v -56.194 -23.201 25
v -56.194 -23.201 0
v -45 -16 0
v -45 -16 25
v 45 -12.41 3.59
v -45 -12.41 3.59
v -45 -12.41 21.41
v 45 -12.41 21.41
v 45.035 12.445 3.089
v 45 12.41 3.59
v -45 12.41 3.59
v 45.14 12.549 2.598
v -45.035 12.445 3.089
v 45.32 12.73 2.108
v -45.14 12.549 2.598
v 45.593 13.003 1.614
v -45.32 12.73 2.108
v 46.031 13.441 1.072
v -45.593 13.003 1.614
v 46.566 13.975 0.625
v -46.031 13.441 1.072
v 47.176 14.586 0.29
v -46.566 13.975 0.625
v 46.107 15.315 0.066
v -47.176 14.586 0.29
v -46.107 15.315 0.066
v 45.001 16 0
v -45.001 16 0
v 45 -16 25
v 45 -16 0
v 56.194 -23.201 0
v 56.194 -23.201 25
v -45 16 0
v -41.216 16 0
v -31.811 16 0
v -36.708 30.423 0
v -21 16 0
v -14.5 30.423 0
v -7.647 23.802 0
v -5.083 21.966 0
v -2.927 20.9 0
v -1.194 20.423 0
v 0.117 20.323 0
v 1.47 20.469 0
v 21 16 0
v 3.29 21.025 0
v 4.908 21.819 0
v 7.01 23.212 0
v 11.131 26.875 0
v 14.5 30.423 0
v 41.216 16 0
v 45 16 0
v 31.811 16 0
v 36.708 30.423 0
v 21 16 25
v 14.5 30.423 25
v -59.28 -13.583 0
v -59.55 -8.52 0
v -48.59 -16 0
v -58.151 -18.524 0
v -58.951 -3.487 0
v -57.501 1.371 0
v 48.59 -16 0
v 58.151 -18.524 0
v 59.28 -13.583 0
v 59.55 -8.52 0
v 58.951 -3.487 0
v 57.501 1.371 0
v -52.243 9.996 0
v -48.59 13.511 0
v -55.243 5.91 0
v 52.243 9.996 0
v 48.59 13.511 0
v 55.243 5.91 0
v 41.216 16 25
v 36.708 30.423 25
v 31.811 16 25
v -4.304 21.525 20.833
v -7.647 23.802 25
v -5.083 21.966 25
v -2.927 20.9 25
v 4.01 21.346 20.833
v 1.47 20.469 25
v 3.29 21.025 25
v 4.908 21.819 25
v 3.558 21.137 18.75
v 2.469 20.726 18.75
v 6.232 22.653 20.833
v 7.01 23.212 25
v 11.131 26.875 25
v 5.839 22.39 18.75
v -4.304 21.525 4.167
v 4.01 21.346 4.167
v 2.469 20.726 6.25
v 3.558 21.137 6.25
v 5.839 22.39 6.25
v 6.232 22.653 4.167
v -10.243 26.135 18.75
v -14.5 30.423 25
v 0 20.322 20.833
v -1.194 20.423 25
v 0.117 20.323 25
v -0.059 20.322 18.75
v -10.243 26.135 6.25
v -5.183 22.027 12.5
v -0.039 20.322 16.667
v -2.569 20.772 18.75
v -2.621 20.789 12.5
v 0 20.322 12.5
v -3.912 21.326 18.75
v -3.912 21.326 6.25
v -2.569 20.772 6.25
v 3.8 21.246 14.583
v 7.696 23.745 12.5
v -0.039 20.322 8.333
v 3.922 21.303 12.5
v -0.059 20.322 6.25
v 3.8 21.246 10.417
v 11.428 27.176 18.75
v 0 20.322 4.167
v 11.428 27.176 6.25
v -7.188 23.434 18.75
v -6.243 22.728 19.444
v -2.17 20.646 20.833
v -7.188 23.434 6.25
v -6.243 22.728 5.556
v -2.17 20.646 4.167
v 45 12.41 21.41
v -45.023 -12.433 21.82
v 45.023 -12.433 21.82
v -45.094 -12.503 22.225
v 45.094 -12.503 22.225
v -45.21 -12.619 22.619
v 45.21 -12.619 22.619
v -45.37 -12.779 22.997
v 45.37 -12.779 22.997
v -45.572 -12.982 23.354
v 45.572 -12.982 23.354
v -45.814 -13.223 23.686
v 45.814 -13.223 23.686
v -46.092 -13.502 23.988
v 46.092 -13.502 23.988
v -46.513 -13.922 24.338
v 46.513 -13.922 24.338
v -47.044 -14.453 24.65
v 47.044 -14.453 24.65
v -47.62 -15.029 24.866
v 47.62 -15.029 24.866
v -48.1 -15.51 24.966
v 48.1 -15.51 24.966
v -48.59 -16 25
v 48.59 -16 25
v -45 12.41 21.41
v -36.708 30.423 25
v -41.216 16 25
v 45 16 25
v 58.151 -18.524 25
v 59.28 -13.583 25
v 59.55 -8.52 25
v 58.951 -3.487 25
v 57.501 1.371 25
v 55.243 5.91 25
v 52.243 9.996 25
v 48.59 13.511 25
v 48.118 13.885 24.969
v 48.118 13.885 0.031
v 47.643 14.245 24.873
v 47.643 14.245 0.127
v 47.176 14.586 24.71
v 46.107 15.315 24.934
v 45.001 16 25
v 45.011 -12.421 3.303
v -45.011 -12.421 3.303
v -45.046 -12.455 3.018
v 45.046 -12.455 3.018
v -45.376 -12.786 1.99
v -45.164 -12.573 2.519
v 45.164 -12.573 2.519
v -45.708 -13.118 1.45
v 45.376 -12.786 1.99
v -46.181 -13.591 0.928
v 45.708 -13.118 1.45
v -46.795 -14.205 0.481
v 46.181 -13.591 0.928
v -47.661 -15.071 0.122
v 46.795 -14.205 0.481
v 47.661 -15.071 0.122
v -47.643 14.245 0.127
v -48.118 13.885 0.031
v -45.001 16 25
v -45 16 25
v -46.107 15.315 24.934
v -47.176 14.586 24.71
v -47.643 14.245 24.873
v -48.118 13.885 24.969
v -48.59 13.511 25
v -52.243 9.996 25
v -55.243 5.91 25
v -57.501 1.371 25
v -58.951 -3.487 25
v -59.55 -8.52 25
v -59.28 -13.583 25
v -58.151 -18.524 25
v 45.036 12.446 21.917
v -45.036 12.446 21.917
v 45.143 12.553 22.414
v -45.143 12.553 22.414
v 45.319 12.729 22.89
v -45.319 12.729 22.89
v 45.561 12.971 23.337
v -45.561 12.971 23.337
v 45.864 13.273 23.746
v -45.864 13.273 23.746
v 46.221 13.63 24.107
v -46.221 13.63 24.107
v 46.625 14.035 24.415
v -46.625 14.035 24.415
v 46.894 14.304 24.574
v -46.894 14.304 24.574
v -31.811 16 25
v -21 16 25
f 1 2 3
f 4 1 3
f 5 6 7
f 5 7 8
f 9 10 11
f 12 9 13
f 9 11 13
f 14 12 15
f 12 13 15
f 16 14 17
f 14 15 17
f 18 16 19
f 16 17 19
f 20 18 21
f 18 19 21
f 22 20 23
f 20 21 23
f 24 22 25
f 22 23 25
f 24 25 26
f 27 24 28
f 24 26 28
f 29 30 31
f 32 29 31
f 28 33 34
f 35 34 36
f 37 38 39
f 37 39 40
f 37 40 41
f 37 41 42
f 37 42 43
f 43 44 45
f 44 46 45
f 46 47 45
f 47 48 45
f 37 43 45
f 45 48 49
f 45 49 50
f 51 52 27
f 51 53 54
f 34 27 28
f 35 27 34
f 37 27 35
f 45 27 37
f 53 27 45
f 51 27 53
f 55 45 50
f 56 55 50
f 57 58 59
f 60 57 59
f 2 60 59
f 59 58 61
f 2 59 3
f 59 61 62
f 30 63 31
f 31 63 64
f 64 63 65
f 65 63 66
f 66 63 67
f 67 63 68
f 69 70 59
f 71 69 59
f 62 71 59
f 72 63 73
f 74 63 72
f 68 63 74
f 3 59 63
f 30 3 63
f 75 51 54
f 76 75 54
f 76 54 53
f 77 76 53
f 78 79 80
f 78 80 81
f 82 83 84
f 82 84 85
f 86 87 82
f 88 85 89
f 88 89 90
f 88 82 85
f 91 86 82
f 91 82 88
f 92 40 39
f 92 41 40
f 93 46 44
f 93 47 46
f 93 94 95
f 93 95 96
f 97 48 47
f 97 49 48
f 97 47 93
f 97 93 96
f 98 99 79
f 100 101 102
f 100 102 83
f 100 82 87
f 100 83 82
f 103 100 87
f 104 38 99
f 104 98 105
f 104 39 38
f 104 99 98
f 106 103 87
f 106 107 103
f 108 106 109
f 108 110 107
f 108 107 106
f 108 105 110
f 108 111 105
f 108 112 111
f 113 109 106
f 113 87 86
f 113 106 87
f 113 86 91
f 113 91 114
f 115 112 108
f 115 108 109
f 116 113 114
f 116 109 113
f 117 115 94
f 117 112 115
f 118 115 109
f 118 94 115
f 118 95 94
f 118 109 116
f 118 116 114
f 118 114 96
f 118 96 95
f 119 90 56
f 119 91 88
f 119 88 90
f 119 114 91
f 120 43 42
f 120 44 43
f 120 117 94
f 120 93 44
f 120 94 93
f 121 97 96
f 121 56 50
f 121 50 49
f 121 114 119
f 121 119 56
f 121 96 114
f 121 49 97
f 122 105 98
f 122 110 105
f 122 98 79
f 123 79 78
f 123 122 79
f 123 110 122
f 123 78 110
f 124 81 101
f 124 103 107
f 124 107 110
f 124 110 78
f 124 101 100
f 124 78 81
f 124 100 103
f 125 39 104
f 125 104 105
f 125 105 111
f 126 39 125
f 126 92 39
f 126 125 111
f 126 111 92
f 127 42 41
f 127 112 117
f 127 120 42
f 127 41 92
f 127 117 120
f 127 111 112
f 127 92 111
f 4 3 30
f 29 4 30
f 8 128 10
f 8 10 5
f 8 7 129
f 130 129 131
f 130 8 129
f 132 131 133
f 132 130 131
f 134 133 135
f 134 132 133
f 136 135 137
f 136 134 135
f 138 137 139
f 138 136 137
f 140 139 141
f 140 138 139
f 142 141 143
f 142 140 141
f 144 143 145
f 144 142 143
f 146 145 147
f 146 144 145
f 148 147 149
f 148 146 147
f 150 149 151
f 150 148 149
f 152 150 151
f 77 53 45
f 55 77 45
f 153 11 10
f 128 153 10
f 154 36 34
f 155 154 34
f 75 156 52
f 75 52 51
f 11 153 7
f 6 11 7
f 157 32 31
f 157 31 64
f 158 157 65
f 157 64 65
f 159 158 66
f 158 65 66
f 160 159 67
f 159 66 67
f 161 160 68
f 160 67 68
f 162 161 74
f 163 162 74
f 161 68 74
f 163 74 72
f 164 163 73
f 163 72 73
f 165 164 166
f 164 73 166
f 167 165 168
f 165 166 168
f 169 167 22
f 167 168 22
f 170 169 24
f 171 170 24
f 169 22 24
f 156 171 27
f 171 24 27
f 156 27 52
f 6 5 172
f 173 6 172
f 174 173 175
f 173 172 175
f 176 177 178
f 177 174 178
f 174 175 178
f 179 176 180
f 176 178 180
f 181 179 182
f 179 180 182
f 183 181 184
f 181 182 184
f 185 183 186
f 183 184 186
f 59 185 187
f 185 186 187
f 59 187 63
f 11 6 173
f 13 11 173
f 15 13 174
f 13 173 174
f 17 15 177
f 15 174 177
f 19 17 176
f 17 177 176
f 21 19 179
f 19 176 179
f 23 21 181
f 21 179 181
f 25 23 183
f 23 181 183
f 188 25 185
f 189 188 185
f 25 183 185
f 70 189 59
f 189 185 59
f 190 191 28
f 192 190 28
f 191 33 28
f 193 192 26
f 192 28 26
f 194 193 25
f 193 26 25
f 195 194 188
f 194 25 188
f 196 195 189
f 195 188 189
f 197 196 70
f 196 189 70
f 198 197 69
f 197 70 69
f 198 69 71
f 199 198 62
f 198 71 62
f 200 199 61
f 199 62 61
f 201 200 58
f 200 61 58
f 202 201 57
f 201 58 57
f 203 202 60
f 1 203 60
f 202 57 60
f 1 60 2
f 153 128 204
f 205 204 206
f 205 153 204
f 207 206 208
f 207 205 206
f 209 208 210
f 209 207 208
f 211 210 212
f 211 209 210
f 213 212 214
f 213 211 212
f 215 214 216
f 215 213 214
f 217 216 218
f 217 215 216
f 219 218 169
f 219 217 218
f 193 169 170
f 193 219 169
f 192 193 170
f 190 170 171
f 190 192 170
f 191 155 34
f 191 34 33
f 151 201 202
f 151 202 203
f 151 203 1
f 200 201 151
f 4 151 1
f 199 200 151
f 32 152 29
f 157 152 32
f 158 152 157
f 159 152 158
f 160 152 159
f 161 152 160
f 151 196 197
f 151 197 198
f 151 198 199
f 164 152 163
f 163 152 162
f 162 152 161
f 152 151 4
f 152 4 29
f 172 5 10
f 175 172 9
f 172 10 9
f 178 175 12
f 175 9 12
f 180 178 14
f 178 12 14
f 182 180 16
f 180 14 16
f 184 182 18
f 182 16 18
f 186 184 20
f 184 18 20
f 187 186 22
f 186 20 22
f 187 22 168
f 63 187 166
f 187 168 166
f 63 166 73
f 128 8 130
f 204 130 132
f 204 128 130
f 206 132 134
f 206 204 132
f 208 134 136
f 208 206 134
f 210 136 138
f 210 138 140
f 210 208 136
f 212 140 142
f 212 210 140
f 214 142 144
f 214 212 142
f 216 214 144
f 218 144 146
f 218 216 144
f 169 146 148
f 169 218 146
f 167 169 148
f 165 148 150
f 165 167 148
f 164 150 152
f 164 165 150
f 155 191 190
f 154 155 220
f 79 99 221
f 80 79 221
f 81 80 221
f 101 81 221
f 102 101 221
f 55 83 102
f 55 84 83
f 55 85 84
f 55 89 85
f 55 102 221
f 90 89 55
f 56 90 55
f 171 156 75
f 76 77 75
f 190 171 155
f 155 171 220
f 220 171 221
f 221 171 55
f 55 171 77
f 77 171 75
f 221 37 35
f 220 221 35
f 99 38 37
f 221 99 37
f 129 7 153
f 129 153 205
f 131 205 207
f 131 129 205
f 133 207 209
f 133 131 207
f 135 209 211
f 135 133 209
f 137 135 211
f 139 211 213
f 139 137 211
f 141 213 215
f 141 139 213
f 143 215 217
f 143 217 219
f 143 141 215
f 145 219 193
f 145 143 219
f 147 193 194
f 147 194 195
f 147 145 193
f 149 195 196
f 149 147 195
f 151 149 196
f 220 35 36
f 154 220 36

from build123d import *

# Parameters (mm, degrees)
F0_W          = 90
F0_H          = 3.590326354
F1_DEPTH      = 25
F2_T1_DEPTH   = 90
F2_T3_DEPTH   = 24.819347292
F2_T9_DEPTH   = 33.794347292
F2_S10_R      = 29.5790540859
F2_T11_DEPTH  = 19
F2_T15_DEPTH  = 98.975
F2_S16_R      = 29.5790540859
F2_T17_DEPTH  = 51
F2_T24_DEPTH  = 33.794347292
F2_S25_R      = 29.5790540859
F2_T26_DEPTH  = 19
F2_T30_DEPTH  = 98.975
F2_S31_R      = 29.5790540859
F2_T32_DEPTH  = 51
F2_T39_DEPTH  = 33.794347292
F2_S40_R      = 29.5790540859
F2_T41_DEPTH  = 19
F2_T45_DEPTH  = 98.975
F2_S46_R      = 29.5790540859
F2_T47_DEPTH  = 51
F2_T54_DEPTH  = 33.794347292
F2_S55_R      = 29.5790540859
F2_T56_DEPTH  = 19
F2_T60_DEPTH  = 98.975
F2_S61_R      = 29.5790540859
F2_T62_DEPTH  = 51
F2_T69_DEPTH  = 33.794347292
F2_T74_DEPTH  = 98.975
F2_T81_DEPTH  = 98.975
F2_T85_DEPTH  = 33.794347292
F2_T93_DEPTH  = 33.794347292
F2_T98_DEPTH  = 98.975
F2_T105_DEPTH = 98.975
F2_T109_DEPTH = 33.794347292


# Not quite as in the source:
# - a fillet or chamfer that OpenCascade refuses, or shapes differently, is made with other operations: its cross-section is extruded or revolved along the edge and cut away or added
# - a feature names something its author has since deleted; it is built from what else it names


with BuildPart() as f1:
    # F0 (on Top) → F1 (new body)
    with BuildSketch(Plane.XY):
        with BuildLine():
            Line((-56.193638593, -23.2007224411), (-45, -16))
            Line((-45, -16), (-45, -12.409673646))
            Line((-45, -12.409673646), (-45, 12.409673646))
            Line((-45, 12.409673646), (-45, 16))
            ThreePointArc((-45, 16), (-58.4287061492, -1.3639914429), (-56.193638593, -23.2007224411))
        make_face()
        with Locations((0, -14.204836823)):
            Rectangle(F0_W, F0_H)
        with BuildLine():
            Line((-21, 16), (21, 16))
            Line((21, 16), (14.5, 30.4228551942))
            add(Edge.make_bspline(
                [(-14.5, 30.4228551942), (-10.8359592966, 26.8576538948), (-0.1359775646, 13.802028979), (11.1079144259, 26.8256423781), (14.5, 30.4228551942)],
                knots=[0, 0, 0, 0, 0.5, 1, 1, 1, 1], degree=3))
            Line((-14.5, 30.4228551942), (-21, 16))
        make_face()
        with BuildLine():
            Line((45, -12.409673646), (45, -16))
            Line((45, -16), (56.193638593, -23.2007224411))
            ThreePointArc((56.193638593, -23.2007224411), (58.4287061492, -1.3639914429), (45, 16))
            Line((45, 16), (45, 12.409673646))
            Line((45, 12.409673646), (45, -12.409673646))
        make_face()
        Polygon((-36.7079592892, 30.4228551942), (-41.2157252431, 16), (-31.8110659719, 16), align=None)
        Polygon((31.8110659719, 16), (41.2157252431, 16), (36.7079592892, 30.4228551942), align=None)
        Polygon((-45, 12.409673646), (45, 12.409673646), (45, 16), (41.2157252431, 16), (31.8110659719, 16), (21, 16), (-21, 16), (-31.8110659719, 16), (-41.2157252431, 16), (-45, 16), align=None)
    extrude(amount=F1_DEPTH)

    # F2: fillet of radius 3.59 on 8 edges, made by hand

    # F2_s2 → F2_t1 (cut)
    with BuildSketch(Plane.YZ.offset(-45)):
        with BuildLine():
            ThreePointArc((12.409673646, 21.41), (13.4611603015, 23.9485133445), (15.999673646, 25))
            Line((15.999673646, 25), (12.409673646, 25))
            Line((12.409673646, 25), (12.409673646, 21.41))
        make_face()
        with BuildLine():
            ThreePointArc((12.409673646, 3.59), (13.4611603015, 1.0514866555), (15.999673646, 0))
            Line((15.999673646, 0), (12.409673646, 0))
            Line((12.409673646, 0), (12.409673646, 3.59))
        make_face()
        with BuildLine():
            ThreePointArc((-12.409673646, 3.59), (-13.4611603015, 1.0514866555), (-15.999673646, 0))
            Line((-15.999673646, 0), (-12.409673646, 0))
            Line((-12.409673646, 0), (-12.409673646, 3.59))
        make_face()
        with BuildLine():
            ThreePointArc((-12.409673646, 21.41), (-13.4611603015, 23.9485133445), (-15.999673646, 25))
            Line((-15.999673646, 25), (-12.409673646, 25))
            Line((-12.409673646, 25), (-12.409673646, 21.41))
        make_face()
    extrude(amount=F2_T1_DEPTH, mode=Mode.SUBTRACT)

    # F2_s4 → F2_t3 (cut)
    with BuildSketch(Plane.XZ.offset(-12.409673646)):
        with BuildLine():
            ThreePointArc((-45, 21.41), (-46.0514866555, 23.9485133445), (-48.59, 25))
            Line((-48.59, 25), (-45, 25))
            Line((-45, 25), (-45, 21.41))
        make_face()
        with BuildLine():
            ThreePointArc((-45, 3.59), (-46.0514866555, 1.0514866555), (-48.59, 0))
            Line((-48.59, 0), (-45, 0))
            Line((-45, 0), (-45, 3.59))
        make_face()
        with BuildLine():
            ThreePointArc((45, 21.41), (46.0514866555, 23.9485133445), (48.59, 25))
            Line((48.59, 25), (45, 25))
            Line((45, 25), (45, 21.41))
        make_face()
        with BuildLine():
            ThreePointArc((45, 3.59), (46.0514866555, 1.0514866555), (48.59, 0))
            Line((48.59, 0), (45, 0))
            Line((45, 0), (45, 3.59))
        make_face()
    extrude(amount=F2_T3_DEPTH, mode=Mode.SUBTRACT)


with BuildPart() as f2_tool7:
    # F2_s8 → F2_t9 (new body)
    with BuildSketch(Plane.XZ.offset(12.409673646)):
        with BuildLine():
            ThreePointArc((-45, 21.41), (-46.0514866555, 23.9485133445), (-48.59, 25))
            Line((-48.59, 25), (-45, 25))
            Line((-45, 25), (-45, 21.41))
        make_face()
    extrude(amount=-F2_T9_DEPTH)

    # F2_s10 → F2_t11 (intersect, symmetric)
    with BuildSketch(Plane.XY.offset(23.2)):
        with Locations((-29.9864788785, -9.4855767867)):
            Circle(F2_S10_R)
    extrude(amount=F2_T11_DEPTH, both=True, mode=Mode.INTERSECT)

    split(bisect_by=Plane.XZ.offset(-12.409673646), keep=Keep.BOTTOM)


with BuildPart() as f2_tool13:
    # F2_s14 → F2_t15 (new body)
    with BuildSketch(Plane.YZ.offset(-53.975)):
        with BuildLine():
            ThreePointArc((12.409673646, 21.41), (13.4611603015, 23.9485133445), (15.999673646, 25))
            Line((15.999673646, 25), (12.409673646, 25))
            Line((12.409673646, 25), (12.409673646, 21.41))
        make_face()
    extrude(amount=F2_T15_DEPTH)

    # F2_s16 → F2_t17 (intersect, symmetric)
    with BuildSketch(Plane.XY.offset(23.2)):
        with Locations((-29.9864788785, -9.4855767867)):
            Circle(F2_S16_R)
    extrude(amount=F2_T17_DEPTH, both=True, mode=Mode.INTERSECT)

    split(bisect_by=Plane.YZ.offset(-45), keep=Keep.BOTTOM)


with BuildPart() as f2_tool7_1:
    add(f2_tool7.part)

    # F2_t19: intersect F2_tool13
    add(f2_tool13.part, mode=Mode.INTERSECT)


with BuildPart() as f1_1:
    add(f1.part)

    # F2_t5: cut F2_tool7
    add(f2_tool7_1.part, mode=Mode.SUBTRACT)


with BuildPart() as f2_tool22:
    # F2_s23 → F2_t24 (new body)
    with BuildSketch(Plane.XZ.offset(-21.384673646)):
        with BuildLine():
            ThreePointArc((45, 21.41), (46.0514866555, 23.9485133445), (48.59, 25))
            Line((48.59, 25), (45, 25))
            Line((45, 25), (45, 21.41))
        make_face()
    extrude(amount=F2_T24_DEPTH)

    # F2_s25 → F2_t26 (intersect, symmetric)
    with BuildSketch(Plane.XY.offset(23.2)):
        with Locations((29.9864788785, -9.4855767867)):
            Circle(F2_S25_R)
    extrude(amount=F2_T26_DEPTH, both=True, mode=Mode.INTERSECT)

    split(bisect_by=Plane.XZ.offset(-12.409673646), keep=Keep.BOTTOM)


with BuildPart() as f2_tool28:
    # F2_s29 → F2_t30 (new body)
    with BuildSketch(Plane.YZ.offset(-45)):
        with BuildLine():
            ThreePointArc((12.409673646, 21.41), (13.4611603015, 23.9485133445), (15.999673646, 25))
            Line((15.999673646, 25), (12.409673646, 25))
            Line((12.409673646, 25), (12.409673646, 21.41))
        make_face()
    extrude(amount=F2_T30_DEPTH)

    # F2_s31 → F2_t32 (intersect, symmetric)
    with BuildSketch(Plane.XY.offset(23.2)):
        with Locations((29.9864788785, -9.4855767867)):
            Circle(F2_S31_R)
    extrude(amount=F2_T32_DEPTH, both=True, mode=Mode.INTERSECT)

    split(bisect_by=Plane.YZ.offset(45), keep=Keep.TOP)


with BuildPart() as f2_tool22_1:
    add(f2_tool22.part)

    # F2_t34: intersect F2_tool28
    add(f2_tool28.part, mode=Mode.INTERSECT)


with BuildPart() as f1_2:
    add(f1_1.part)

    # F2_t20: cut F2_tool22
    add(f2_tool22_1.part, mode=Mode.SUBTRACT)


with BuildPart() as f2_tool37:
    # F2_s38 → F2_t39 (new body)
    with BuildSketch(Plane.XZ.offset(12.409673646)):
        with BuildLine():
            ThreePointArc((-45, 3.59), (-46.0514866555, 1.0514866555), (-48.59, 0))
            Line((-48.59, 0), (-45, 0))
            Line((-45, 0), (-45, 3.59))
        make_face()
    extrude(amount=-F2_T39_DEPTH)

    # F2_s40 → F2_t41 (intersect, symmetric)
    with BuildSketch(Plane.XY.offset(1.8)):
        with Locations((-29.9864788785, -9.4855767867)):
            Circle(F2_S40_R)
    extrude(amount=F2_T41_DEPTH, both=True, mode=Mode.INTERSECT)

    split(bisect_by=Plane.XZ.offset(-12.409673646), keep=Keep.BOTTOM)


with BuildPart() as f2_tool43:
    # F2_s44 → F2_t45 (new body)
    with BuildSketch(Plane.YZ.offset(-53.975)):
        with BuildLine():
            ThreePointArc((12.409673646, 3.59), (13.4611603015, 1.0514866555), (15.999673646, 0))
            Line((15.999673646, 0), (12.409673646, 0))
            Line((12.409673646, 0), (12.409673646, 3.59))
        make_face()
    extrude(amount=F2_T45_DEPTH)

    # F2_s46 → F2_t47 (intersect, symmetric)
    with BuildSketch(Plane.XY.offset(1.8)):
        with Locations((-29.9864788785, -9.4855767867)):
            Circle(F2_S46_R)
    extrude(amount=F2_T47_DEPTH, both=True, mode=Mode.INTERSECT)

    split(bisect_by=Plane.YZ.offset(-45), keep=Keep.BOTTOM)


with BuildPart() as f2_tool37_1:
    add(f2_tool37.part)

    # F2_t49: intersect F2_tool43
    add(f2_tool43.part, mode=Mode.INTERSECT)


with BuildPart() as f1_3:
    add(f1_2.part)

    # F2_t35: cut F2_tool37
    add(f2_tool37_1.part, mode=Mode.SUBTRACT)


with BuildPart() as f2_tool52:
    # F2_s53 → F2_t54 (new body)
    with BuildSketch(Plane.XZ.offset(-21.384673646)):
        with BuildLine():
            ThreePointArc((45, 3.59), (46.0514866555, 1.0514866555), (48.59, 0))
            Line((48.59, 0), (45, 0))
            Line((45, 0), (45, 3.59))
        make_face()
    extrude(amount=F2_T54_DEPTH)

    # F2_s55 → F2_t56 (intersect, symmetric)
    with BuildSketch(Plane.XY.offset(1.8)):
        with Locations((29.9864788785, -9.4855767867)):
            Circle(F2_S55_R)
    extrude(amount=F2_T56_DEPTH, both=True, mode=Mode.INTERSECT)

    split(bisect_by=Plane.XZ.offset(-12.409673646), keep=Keep.BOTTOM)


with BuildPart() as f2_tool58:
    # F2_s59 → F2_t60 (new body)
    with BuildSketch(Plane.YZ.offset(-45)):
        with BuildLine():
            ThreePointArc((12.409673646, 3.59), (13.4611603015, 1.0514866555), (15.999673646, 0))
            Line((15.999673646, 0), (12.409673646, 0))
            Line((12.409673646, 0), (12.409673646, 3.59))
        make_face()
    extrude(amount=F2_T60_DEPTH)

    # F2_s61 → F2_t62 (intersect, symmetric)
    with BuildSketch(Plane.XY.offset(1.8)):
        with Locations((29.9864788785, -9.4855767867)):
            Circle(F2_S61_R)
    extrude(amount=F2_T62_DEPTH, both=True, mode=Mode.INTERSECT)

    split(bisect_by=Plane.YZ.offset(45), keep=Keep.TOP)


with BuildPart() as f2_tool52_1:
    add(f2_tool52.part)

    # F2_t64: intersect F2_tool58
    add(f2_tool58.part, mode=Mode.INTERSECT)


with BuildPart() as f1_4:
    add(f1_3.part)

    # F2_t50: cut F2_tool52
    add(f2_tool52_1.part, mode=Mode.SUBTRACT)


with BuildPart() as f2_tool67:
    # F2_s68 → F2_t69 (new body)
    with BuildSketch(Plane.XZ.offset(-12.409673646)):
        with BuildLine():
            ThreePointArc((45, 3.59), (46.0514866555, 1.0514866555), (48.59, 0))
            Line((48.59, 0), (45, 0))
            Line((45, 0), (45, 3.59))
        make_face()
    extrude(amount=F2_T69_DEPTH)

    split(bisect_by=Plane.XZ.offset(16), keep=Keep.BOTTOM)

    split(bisect_by=Plane.XZ.offset(12.409673646), keep=Keep.TOP)


with BuildPart() as f2_tool72:
    # F2_s73 → F2_t74 (new body)
    with BuildSketch(Plane.YZ.offset(53.975)):
        with BuildLine():
            ThreePointArc((-12.409673646, 3.59), (-13.4611603015, 1.0514866555), (-15.999673646, 0))
            Line((-15.999673646, 0), (-12.409673646, 0))
            Line((-12.409673646, 0), (-12.409673646, 3.59))
        make_face()
    extrude(amount=-F2_T74_DEPTH)

    split(bisect_by=Plane.YZ.offset(45), keep=Keep.TOP)


with BuildPart() as f2_tool67_1:
    add(f2_tool67.part)

    # F2_t76: intersect F2_tool72
    add(f2_tool72.part, mode=Mode.INTERSECT)


with BuildPart() as f1_5:
    add(f1_4.part)

    # F2_t65: cut F2_tool67
    add(f2_tool67_1.part, mode=Mode.SUBTRACT)


with BuildPart() as f2_tool79:
    # F2_s80 → F2_t81 (new body)
    with BuildSketch(Plane.YZ.offset(45)):
        with BuildLine():
            ThreePointArc((-12.409673646, 3.59), (-13.4611603015, 1.0514866555), (-15.999673646, 0))
            Line((-15.999673646, 0), (-12.409673646, 0))
            Line((-12.409673646, 0), (-12.409673646, 3.59))
        make_face()
    extrude(amount=-F2_T81_DEPTH)

    split(bisect_by=Plane.YZ.offset(-45), keep=Keep.BOTTOM)


with BuildPart() as f2_tool83:
    # F2_s84 → F2_t85 (new body)
    with BuildSketch(Plane.XZ.offset(21.384673646)):
        with BuildLine():
            ThreePointArc((-45, 3.59), (-46.0514866555, 1.0514866555), (-48.59, 0))
            Line((-48.59, 0), (-45, 0))
            Line((-45, 0), (-45, 3.59))
        make_face()
    extrude(amount=-F2_T85_DEPTH)

    split(bisect_by=Plane.XZ.offset(16), keep=Keep.BOTTOM)

    split(bisect_by=Plane.XZ.offset(12.409673646), keep=Keep.TOP)


with BuildPart() as f2_tool79_1:
    add(f2_tool79.part)

    # F2_t88: intersect F2_tool83
    add(f2_tool83.part, mode=Mode.INTERSECT)


with BuildPart() as f1_6:
    add(f1_5.part)

    # F2_t77: cut F2_tool79
    add(f2_tool79_1.part, mode=Mode.SUBTRACT)


with BuildPart() as f2_tool91:
    # F2_s92 → F2_t93 (new body)
    with BuildSketch(Plane.XZ.offset(-12.409673646)):
        with BuildLine():
            ThreePointArc((45, 21.41), (46.0514866555, 23.9485133445), (48.59, 25))
            Line((48.59, 25), (45, 25))
            Line((45, 25), (45, 21.41))
        make_face()
    extrude(amount=F2_T93_DEPTH)

    split(bisect_by=Plane.XZ.offset(16), keep=Keep.BOTTOM)

    split(bisect_by=Plane.XZ.offset(12.409673646), keep=Keep.TOP)


with BuildPart() as f2_tool96:
    # F2_s97 → F2_t98 (new body)
    with BuildSketch(Plane.YZ.offset(53.975)):
        with BuildLine():
            ThreePointArc((-12.409673646, 21.41), (-13.4611603015, 23.9485133445), (-15.999673646, 25))
            Line((-15.999673646, 25), (-12.409673646, 25))
            Line((-12.409673646, 25), (-12.409673646, 21.41))
        make_face()
    extrude(amount=-F2_T98_DEPTH)

    split(bisect_by=Plane.YZ.offset(45), keep=Keep.TOP)


with BuildPart() as f2_tool91_1:
    add(f2_tool91.part)

    # F2_t100: intersect F2_tool96
    add(f2_tool96.part, mode=Mode.INTERSECT)


with BuildPart() as f1_7:
    add(f1_6.part)

    # F2_t89: cut F2_tool91
    add(f2_tool91_1.part, mode=Mode.SUBTRACT)


with BuildPart() as f2_tool103:
    # F2_s104 → F2_t105 (new body)
    with BuildSketch(Plane.YZ.offset(45)):
        with BuildLine():
            ThreePointArc((-12.409673646, 21.41), (-13.4611603015, 23.9485133445), (-15.999673646, 25))
            Line((-15.999673646, 25), (-12.409673646, 25))
            Line((-12.409673646, 25), (-12.409673646, 21.41))
        make_face()
    extrude(amount=-F2_T105_DEPTH)

    split(bisect_by=Plane.YZ.offset(-45), keep=Keep.BOTTOM)


with BuildPart() as f2_tool107:
    # F2_s108 → F2_t109 (new body)
    with BuildSketch(Plane.XZ.offset(21.384673646)):
        with BuildLine():
            ThreePointArc((-45, 21.41), (-46.0514866555, 23.9485133445), (-48.59, 25))
            Line((-48.59, 25), (-45, 25))
            Line((-45, 25), (-45, 21.41))
        make_face()
    extrude(amount=-F2_T109_DEPTH)

    split(bisect_by=Plane.XZ.offset(16), keep=Keep.BOTTOM)

    split(bisect_by=Plane.XZ.offset(12.409673646), keep=Keep.TOP)


with BuildPart() as f2_tool103_1:
    add(f2_tool103.part)

    # F2_t112: intersect F2_tool107
    add(f2_tool107.part, mode=Mode.INTERSECT)


with BuildPart() as f1_8:
    add(f1_7.part)

    # F2_t101: cut F2_tool103
    add(f2_tool103_1.part, mode=Mode.SUBTRACT)


solid = f1_8.part
